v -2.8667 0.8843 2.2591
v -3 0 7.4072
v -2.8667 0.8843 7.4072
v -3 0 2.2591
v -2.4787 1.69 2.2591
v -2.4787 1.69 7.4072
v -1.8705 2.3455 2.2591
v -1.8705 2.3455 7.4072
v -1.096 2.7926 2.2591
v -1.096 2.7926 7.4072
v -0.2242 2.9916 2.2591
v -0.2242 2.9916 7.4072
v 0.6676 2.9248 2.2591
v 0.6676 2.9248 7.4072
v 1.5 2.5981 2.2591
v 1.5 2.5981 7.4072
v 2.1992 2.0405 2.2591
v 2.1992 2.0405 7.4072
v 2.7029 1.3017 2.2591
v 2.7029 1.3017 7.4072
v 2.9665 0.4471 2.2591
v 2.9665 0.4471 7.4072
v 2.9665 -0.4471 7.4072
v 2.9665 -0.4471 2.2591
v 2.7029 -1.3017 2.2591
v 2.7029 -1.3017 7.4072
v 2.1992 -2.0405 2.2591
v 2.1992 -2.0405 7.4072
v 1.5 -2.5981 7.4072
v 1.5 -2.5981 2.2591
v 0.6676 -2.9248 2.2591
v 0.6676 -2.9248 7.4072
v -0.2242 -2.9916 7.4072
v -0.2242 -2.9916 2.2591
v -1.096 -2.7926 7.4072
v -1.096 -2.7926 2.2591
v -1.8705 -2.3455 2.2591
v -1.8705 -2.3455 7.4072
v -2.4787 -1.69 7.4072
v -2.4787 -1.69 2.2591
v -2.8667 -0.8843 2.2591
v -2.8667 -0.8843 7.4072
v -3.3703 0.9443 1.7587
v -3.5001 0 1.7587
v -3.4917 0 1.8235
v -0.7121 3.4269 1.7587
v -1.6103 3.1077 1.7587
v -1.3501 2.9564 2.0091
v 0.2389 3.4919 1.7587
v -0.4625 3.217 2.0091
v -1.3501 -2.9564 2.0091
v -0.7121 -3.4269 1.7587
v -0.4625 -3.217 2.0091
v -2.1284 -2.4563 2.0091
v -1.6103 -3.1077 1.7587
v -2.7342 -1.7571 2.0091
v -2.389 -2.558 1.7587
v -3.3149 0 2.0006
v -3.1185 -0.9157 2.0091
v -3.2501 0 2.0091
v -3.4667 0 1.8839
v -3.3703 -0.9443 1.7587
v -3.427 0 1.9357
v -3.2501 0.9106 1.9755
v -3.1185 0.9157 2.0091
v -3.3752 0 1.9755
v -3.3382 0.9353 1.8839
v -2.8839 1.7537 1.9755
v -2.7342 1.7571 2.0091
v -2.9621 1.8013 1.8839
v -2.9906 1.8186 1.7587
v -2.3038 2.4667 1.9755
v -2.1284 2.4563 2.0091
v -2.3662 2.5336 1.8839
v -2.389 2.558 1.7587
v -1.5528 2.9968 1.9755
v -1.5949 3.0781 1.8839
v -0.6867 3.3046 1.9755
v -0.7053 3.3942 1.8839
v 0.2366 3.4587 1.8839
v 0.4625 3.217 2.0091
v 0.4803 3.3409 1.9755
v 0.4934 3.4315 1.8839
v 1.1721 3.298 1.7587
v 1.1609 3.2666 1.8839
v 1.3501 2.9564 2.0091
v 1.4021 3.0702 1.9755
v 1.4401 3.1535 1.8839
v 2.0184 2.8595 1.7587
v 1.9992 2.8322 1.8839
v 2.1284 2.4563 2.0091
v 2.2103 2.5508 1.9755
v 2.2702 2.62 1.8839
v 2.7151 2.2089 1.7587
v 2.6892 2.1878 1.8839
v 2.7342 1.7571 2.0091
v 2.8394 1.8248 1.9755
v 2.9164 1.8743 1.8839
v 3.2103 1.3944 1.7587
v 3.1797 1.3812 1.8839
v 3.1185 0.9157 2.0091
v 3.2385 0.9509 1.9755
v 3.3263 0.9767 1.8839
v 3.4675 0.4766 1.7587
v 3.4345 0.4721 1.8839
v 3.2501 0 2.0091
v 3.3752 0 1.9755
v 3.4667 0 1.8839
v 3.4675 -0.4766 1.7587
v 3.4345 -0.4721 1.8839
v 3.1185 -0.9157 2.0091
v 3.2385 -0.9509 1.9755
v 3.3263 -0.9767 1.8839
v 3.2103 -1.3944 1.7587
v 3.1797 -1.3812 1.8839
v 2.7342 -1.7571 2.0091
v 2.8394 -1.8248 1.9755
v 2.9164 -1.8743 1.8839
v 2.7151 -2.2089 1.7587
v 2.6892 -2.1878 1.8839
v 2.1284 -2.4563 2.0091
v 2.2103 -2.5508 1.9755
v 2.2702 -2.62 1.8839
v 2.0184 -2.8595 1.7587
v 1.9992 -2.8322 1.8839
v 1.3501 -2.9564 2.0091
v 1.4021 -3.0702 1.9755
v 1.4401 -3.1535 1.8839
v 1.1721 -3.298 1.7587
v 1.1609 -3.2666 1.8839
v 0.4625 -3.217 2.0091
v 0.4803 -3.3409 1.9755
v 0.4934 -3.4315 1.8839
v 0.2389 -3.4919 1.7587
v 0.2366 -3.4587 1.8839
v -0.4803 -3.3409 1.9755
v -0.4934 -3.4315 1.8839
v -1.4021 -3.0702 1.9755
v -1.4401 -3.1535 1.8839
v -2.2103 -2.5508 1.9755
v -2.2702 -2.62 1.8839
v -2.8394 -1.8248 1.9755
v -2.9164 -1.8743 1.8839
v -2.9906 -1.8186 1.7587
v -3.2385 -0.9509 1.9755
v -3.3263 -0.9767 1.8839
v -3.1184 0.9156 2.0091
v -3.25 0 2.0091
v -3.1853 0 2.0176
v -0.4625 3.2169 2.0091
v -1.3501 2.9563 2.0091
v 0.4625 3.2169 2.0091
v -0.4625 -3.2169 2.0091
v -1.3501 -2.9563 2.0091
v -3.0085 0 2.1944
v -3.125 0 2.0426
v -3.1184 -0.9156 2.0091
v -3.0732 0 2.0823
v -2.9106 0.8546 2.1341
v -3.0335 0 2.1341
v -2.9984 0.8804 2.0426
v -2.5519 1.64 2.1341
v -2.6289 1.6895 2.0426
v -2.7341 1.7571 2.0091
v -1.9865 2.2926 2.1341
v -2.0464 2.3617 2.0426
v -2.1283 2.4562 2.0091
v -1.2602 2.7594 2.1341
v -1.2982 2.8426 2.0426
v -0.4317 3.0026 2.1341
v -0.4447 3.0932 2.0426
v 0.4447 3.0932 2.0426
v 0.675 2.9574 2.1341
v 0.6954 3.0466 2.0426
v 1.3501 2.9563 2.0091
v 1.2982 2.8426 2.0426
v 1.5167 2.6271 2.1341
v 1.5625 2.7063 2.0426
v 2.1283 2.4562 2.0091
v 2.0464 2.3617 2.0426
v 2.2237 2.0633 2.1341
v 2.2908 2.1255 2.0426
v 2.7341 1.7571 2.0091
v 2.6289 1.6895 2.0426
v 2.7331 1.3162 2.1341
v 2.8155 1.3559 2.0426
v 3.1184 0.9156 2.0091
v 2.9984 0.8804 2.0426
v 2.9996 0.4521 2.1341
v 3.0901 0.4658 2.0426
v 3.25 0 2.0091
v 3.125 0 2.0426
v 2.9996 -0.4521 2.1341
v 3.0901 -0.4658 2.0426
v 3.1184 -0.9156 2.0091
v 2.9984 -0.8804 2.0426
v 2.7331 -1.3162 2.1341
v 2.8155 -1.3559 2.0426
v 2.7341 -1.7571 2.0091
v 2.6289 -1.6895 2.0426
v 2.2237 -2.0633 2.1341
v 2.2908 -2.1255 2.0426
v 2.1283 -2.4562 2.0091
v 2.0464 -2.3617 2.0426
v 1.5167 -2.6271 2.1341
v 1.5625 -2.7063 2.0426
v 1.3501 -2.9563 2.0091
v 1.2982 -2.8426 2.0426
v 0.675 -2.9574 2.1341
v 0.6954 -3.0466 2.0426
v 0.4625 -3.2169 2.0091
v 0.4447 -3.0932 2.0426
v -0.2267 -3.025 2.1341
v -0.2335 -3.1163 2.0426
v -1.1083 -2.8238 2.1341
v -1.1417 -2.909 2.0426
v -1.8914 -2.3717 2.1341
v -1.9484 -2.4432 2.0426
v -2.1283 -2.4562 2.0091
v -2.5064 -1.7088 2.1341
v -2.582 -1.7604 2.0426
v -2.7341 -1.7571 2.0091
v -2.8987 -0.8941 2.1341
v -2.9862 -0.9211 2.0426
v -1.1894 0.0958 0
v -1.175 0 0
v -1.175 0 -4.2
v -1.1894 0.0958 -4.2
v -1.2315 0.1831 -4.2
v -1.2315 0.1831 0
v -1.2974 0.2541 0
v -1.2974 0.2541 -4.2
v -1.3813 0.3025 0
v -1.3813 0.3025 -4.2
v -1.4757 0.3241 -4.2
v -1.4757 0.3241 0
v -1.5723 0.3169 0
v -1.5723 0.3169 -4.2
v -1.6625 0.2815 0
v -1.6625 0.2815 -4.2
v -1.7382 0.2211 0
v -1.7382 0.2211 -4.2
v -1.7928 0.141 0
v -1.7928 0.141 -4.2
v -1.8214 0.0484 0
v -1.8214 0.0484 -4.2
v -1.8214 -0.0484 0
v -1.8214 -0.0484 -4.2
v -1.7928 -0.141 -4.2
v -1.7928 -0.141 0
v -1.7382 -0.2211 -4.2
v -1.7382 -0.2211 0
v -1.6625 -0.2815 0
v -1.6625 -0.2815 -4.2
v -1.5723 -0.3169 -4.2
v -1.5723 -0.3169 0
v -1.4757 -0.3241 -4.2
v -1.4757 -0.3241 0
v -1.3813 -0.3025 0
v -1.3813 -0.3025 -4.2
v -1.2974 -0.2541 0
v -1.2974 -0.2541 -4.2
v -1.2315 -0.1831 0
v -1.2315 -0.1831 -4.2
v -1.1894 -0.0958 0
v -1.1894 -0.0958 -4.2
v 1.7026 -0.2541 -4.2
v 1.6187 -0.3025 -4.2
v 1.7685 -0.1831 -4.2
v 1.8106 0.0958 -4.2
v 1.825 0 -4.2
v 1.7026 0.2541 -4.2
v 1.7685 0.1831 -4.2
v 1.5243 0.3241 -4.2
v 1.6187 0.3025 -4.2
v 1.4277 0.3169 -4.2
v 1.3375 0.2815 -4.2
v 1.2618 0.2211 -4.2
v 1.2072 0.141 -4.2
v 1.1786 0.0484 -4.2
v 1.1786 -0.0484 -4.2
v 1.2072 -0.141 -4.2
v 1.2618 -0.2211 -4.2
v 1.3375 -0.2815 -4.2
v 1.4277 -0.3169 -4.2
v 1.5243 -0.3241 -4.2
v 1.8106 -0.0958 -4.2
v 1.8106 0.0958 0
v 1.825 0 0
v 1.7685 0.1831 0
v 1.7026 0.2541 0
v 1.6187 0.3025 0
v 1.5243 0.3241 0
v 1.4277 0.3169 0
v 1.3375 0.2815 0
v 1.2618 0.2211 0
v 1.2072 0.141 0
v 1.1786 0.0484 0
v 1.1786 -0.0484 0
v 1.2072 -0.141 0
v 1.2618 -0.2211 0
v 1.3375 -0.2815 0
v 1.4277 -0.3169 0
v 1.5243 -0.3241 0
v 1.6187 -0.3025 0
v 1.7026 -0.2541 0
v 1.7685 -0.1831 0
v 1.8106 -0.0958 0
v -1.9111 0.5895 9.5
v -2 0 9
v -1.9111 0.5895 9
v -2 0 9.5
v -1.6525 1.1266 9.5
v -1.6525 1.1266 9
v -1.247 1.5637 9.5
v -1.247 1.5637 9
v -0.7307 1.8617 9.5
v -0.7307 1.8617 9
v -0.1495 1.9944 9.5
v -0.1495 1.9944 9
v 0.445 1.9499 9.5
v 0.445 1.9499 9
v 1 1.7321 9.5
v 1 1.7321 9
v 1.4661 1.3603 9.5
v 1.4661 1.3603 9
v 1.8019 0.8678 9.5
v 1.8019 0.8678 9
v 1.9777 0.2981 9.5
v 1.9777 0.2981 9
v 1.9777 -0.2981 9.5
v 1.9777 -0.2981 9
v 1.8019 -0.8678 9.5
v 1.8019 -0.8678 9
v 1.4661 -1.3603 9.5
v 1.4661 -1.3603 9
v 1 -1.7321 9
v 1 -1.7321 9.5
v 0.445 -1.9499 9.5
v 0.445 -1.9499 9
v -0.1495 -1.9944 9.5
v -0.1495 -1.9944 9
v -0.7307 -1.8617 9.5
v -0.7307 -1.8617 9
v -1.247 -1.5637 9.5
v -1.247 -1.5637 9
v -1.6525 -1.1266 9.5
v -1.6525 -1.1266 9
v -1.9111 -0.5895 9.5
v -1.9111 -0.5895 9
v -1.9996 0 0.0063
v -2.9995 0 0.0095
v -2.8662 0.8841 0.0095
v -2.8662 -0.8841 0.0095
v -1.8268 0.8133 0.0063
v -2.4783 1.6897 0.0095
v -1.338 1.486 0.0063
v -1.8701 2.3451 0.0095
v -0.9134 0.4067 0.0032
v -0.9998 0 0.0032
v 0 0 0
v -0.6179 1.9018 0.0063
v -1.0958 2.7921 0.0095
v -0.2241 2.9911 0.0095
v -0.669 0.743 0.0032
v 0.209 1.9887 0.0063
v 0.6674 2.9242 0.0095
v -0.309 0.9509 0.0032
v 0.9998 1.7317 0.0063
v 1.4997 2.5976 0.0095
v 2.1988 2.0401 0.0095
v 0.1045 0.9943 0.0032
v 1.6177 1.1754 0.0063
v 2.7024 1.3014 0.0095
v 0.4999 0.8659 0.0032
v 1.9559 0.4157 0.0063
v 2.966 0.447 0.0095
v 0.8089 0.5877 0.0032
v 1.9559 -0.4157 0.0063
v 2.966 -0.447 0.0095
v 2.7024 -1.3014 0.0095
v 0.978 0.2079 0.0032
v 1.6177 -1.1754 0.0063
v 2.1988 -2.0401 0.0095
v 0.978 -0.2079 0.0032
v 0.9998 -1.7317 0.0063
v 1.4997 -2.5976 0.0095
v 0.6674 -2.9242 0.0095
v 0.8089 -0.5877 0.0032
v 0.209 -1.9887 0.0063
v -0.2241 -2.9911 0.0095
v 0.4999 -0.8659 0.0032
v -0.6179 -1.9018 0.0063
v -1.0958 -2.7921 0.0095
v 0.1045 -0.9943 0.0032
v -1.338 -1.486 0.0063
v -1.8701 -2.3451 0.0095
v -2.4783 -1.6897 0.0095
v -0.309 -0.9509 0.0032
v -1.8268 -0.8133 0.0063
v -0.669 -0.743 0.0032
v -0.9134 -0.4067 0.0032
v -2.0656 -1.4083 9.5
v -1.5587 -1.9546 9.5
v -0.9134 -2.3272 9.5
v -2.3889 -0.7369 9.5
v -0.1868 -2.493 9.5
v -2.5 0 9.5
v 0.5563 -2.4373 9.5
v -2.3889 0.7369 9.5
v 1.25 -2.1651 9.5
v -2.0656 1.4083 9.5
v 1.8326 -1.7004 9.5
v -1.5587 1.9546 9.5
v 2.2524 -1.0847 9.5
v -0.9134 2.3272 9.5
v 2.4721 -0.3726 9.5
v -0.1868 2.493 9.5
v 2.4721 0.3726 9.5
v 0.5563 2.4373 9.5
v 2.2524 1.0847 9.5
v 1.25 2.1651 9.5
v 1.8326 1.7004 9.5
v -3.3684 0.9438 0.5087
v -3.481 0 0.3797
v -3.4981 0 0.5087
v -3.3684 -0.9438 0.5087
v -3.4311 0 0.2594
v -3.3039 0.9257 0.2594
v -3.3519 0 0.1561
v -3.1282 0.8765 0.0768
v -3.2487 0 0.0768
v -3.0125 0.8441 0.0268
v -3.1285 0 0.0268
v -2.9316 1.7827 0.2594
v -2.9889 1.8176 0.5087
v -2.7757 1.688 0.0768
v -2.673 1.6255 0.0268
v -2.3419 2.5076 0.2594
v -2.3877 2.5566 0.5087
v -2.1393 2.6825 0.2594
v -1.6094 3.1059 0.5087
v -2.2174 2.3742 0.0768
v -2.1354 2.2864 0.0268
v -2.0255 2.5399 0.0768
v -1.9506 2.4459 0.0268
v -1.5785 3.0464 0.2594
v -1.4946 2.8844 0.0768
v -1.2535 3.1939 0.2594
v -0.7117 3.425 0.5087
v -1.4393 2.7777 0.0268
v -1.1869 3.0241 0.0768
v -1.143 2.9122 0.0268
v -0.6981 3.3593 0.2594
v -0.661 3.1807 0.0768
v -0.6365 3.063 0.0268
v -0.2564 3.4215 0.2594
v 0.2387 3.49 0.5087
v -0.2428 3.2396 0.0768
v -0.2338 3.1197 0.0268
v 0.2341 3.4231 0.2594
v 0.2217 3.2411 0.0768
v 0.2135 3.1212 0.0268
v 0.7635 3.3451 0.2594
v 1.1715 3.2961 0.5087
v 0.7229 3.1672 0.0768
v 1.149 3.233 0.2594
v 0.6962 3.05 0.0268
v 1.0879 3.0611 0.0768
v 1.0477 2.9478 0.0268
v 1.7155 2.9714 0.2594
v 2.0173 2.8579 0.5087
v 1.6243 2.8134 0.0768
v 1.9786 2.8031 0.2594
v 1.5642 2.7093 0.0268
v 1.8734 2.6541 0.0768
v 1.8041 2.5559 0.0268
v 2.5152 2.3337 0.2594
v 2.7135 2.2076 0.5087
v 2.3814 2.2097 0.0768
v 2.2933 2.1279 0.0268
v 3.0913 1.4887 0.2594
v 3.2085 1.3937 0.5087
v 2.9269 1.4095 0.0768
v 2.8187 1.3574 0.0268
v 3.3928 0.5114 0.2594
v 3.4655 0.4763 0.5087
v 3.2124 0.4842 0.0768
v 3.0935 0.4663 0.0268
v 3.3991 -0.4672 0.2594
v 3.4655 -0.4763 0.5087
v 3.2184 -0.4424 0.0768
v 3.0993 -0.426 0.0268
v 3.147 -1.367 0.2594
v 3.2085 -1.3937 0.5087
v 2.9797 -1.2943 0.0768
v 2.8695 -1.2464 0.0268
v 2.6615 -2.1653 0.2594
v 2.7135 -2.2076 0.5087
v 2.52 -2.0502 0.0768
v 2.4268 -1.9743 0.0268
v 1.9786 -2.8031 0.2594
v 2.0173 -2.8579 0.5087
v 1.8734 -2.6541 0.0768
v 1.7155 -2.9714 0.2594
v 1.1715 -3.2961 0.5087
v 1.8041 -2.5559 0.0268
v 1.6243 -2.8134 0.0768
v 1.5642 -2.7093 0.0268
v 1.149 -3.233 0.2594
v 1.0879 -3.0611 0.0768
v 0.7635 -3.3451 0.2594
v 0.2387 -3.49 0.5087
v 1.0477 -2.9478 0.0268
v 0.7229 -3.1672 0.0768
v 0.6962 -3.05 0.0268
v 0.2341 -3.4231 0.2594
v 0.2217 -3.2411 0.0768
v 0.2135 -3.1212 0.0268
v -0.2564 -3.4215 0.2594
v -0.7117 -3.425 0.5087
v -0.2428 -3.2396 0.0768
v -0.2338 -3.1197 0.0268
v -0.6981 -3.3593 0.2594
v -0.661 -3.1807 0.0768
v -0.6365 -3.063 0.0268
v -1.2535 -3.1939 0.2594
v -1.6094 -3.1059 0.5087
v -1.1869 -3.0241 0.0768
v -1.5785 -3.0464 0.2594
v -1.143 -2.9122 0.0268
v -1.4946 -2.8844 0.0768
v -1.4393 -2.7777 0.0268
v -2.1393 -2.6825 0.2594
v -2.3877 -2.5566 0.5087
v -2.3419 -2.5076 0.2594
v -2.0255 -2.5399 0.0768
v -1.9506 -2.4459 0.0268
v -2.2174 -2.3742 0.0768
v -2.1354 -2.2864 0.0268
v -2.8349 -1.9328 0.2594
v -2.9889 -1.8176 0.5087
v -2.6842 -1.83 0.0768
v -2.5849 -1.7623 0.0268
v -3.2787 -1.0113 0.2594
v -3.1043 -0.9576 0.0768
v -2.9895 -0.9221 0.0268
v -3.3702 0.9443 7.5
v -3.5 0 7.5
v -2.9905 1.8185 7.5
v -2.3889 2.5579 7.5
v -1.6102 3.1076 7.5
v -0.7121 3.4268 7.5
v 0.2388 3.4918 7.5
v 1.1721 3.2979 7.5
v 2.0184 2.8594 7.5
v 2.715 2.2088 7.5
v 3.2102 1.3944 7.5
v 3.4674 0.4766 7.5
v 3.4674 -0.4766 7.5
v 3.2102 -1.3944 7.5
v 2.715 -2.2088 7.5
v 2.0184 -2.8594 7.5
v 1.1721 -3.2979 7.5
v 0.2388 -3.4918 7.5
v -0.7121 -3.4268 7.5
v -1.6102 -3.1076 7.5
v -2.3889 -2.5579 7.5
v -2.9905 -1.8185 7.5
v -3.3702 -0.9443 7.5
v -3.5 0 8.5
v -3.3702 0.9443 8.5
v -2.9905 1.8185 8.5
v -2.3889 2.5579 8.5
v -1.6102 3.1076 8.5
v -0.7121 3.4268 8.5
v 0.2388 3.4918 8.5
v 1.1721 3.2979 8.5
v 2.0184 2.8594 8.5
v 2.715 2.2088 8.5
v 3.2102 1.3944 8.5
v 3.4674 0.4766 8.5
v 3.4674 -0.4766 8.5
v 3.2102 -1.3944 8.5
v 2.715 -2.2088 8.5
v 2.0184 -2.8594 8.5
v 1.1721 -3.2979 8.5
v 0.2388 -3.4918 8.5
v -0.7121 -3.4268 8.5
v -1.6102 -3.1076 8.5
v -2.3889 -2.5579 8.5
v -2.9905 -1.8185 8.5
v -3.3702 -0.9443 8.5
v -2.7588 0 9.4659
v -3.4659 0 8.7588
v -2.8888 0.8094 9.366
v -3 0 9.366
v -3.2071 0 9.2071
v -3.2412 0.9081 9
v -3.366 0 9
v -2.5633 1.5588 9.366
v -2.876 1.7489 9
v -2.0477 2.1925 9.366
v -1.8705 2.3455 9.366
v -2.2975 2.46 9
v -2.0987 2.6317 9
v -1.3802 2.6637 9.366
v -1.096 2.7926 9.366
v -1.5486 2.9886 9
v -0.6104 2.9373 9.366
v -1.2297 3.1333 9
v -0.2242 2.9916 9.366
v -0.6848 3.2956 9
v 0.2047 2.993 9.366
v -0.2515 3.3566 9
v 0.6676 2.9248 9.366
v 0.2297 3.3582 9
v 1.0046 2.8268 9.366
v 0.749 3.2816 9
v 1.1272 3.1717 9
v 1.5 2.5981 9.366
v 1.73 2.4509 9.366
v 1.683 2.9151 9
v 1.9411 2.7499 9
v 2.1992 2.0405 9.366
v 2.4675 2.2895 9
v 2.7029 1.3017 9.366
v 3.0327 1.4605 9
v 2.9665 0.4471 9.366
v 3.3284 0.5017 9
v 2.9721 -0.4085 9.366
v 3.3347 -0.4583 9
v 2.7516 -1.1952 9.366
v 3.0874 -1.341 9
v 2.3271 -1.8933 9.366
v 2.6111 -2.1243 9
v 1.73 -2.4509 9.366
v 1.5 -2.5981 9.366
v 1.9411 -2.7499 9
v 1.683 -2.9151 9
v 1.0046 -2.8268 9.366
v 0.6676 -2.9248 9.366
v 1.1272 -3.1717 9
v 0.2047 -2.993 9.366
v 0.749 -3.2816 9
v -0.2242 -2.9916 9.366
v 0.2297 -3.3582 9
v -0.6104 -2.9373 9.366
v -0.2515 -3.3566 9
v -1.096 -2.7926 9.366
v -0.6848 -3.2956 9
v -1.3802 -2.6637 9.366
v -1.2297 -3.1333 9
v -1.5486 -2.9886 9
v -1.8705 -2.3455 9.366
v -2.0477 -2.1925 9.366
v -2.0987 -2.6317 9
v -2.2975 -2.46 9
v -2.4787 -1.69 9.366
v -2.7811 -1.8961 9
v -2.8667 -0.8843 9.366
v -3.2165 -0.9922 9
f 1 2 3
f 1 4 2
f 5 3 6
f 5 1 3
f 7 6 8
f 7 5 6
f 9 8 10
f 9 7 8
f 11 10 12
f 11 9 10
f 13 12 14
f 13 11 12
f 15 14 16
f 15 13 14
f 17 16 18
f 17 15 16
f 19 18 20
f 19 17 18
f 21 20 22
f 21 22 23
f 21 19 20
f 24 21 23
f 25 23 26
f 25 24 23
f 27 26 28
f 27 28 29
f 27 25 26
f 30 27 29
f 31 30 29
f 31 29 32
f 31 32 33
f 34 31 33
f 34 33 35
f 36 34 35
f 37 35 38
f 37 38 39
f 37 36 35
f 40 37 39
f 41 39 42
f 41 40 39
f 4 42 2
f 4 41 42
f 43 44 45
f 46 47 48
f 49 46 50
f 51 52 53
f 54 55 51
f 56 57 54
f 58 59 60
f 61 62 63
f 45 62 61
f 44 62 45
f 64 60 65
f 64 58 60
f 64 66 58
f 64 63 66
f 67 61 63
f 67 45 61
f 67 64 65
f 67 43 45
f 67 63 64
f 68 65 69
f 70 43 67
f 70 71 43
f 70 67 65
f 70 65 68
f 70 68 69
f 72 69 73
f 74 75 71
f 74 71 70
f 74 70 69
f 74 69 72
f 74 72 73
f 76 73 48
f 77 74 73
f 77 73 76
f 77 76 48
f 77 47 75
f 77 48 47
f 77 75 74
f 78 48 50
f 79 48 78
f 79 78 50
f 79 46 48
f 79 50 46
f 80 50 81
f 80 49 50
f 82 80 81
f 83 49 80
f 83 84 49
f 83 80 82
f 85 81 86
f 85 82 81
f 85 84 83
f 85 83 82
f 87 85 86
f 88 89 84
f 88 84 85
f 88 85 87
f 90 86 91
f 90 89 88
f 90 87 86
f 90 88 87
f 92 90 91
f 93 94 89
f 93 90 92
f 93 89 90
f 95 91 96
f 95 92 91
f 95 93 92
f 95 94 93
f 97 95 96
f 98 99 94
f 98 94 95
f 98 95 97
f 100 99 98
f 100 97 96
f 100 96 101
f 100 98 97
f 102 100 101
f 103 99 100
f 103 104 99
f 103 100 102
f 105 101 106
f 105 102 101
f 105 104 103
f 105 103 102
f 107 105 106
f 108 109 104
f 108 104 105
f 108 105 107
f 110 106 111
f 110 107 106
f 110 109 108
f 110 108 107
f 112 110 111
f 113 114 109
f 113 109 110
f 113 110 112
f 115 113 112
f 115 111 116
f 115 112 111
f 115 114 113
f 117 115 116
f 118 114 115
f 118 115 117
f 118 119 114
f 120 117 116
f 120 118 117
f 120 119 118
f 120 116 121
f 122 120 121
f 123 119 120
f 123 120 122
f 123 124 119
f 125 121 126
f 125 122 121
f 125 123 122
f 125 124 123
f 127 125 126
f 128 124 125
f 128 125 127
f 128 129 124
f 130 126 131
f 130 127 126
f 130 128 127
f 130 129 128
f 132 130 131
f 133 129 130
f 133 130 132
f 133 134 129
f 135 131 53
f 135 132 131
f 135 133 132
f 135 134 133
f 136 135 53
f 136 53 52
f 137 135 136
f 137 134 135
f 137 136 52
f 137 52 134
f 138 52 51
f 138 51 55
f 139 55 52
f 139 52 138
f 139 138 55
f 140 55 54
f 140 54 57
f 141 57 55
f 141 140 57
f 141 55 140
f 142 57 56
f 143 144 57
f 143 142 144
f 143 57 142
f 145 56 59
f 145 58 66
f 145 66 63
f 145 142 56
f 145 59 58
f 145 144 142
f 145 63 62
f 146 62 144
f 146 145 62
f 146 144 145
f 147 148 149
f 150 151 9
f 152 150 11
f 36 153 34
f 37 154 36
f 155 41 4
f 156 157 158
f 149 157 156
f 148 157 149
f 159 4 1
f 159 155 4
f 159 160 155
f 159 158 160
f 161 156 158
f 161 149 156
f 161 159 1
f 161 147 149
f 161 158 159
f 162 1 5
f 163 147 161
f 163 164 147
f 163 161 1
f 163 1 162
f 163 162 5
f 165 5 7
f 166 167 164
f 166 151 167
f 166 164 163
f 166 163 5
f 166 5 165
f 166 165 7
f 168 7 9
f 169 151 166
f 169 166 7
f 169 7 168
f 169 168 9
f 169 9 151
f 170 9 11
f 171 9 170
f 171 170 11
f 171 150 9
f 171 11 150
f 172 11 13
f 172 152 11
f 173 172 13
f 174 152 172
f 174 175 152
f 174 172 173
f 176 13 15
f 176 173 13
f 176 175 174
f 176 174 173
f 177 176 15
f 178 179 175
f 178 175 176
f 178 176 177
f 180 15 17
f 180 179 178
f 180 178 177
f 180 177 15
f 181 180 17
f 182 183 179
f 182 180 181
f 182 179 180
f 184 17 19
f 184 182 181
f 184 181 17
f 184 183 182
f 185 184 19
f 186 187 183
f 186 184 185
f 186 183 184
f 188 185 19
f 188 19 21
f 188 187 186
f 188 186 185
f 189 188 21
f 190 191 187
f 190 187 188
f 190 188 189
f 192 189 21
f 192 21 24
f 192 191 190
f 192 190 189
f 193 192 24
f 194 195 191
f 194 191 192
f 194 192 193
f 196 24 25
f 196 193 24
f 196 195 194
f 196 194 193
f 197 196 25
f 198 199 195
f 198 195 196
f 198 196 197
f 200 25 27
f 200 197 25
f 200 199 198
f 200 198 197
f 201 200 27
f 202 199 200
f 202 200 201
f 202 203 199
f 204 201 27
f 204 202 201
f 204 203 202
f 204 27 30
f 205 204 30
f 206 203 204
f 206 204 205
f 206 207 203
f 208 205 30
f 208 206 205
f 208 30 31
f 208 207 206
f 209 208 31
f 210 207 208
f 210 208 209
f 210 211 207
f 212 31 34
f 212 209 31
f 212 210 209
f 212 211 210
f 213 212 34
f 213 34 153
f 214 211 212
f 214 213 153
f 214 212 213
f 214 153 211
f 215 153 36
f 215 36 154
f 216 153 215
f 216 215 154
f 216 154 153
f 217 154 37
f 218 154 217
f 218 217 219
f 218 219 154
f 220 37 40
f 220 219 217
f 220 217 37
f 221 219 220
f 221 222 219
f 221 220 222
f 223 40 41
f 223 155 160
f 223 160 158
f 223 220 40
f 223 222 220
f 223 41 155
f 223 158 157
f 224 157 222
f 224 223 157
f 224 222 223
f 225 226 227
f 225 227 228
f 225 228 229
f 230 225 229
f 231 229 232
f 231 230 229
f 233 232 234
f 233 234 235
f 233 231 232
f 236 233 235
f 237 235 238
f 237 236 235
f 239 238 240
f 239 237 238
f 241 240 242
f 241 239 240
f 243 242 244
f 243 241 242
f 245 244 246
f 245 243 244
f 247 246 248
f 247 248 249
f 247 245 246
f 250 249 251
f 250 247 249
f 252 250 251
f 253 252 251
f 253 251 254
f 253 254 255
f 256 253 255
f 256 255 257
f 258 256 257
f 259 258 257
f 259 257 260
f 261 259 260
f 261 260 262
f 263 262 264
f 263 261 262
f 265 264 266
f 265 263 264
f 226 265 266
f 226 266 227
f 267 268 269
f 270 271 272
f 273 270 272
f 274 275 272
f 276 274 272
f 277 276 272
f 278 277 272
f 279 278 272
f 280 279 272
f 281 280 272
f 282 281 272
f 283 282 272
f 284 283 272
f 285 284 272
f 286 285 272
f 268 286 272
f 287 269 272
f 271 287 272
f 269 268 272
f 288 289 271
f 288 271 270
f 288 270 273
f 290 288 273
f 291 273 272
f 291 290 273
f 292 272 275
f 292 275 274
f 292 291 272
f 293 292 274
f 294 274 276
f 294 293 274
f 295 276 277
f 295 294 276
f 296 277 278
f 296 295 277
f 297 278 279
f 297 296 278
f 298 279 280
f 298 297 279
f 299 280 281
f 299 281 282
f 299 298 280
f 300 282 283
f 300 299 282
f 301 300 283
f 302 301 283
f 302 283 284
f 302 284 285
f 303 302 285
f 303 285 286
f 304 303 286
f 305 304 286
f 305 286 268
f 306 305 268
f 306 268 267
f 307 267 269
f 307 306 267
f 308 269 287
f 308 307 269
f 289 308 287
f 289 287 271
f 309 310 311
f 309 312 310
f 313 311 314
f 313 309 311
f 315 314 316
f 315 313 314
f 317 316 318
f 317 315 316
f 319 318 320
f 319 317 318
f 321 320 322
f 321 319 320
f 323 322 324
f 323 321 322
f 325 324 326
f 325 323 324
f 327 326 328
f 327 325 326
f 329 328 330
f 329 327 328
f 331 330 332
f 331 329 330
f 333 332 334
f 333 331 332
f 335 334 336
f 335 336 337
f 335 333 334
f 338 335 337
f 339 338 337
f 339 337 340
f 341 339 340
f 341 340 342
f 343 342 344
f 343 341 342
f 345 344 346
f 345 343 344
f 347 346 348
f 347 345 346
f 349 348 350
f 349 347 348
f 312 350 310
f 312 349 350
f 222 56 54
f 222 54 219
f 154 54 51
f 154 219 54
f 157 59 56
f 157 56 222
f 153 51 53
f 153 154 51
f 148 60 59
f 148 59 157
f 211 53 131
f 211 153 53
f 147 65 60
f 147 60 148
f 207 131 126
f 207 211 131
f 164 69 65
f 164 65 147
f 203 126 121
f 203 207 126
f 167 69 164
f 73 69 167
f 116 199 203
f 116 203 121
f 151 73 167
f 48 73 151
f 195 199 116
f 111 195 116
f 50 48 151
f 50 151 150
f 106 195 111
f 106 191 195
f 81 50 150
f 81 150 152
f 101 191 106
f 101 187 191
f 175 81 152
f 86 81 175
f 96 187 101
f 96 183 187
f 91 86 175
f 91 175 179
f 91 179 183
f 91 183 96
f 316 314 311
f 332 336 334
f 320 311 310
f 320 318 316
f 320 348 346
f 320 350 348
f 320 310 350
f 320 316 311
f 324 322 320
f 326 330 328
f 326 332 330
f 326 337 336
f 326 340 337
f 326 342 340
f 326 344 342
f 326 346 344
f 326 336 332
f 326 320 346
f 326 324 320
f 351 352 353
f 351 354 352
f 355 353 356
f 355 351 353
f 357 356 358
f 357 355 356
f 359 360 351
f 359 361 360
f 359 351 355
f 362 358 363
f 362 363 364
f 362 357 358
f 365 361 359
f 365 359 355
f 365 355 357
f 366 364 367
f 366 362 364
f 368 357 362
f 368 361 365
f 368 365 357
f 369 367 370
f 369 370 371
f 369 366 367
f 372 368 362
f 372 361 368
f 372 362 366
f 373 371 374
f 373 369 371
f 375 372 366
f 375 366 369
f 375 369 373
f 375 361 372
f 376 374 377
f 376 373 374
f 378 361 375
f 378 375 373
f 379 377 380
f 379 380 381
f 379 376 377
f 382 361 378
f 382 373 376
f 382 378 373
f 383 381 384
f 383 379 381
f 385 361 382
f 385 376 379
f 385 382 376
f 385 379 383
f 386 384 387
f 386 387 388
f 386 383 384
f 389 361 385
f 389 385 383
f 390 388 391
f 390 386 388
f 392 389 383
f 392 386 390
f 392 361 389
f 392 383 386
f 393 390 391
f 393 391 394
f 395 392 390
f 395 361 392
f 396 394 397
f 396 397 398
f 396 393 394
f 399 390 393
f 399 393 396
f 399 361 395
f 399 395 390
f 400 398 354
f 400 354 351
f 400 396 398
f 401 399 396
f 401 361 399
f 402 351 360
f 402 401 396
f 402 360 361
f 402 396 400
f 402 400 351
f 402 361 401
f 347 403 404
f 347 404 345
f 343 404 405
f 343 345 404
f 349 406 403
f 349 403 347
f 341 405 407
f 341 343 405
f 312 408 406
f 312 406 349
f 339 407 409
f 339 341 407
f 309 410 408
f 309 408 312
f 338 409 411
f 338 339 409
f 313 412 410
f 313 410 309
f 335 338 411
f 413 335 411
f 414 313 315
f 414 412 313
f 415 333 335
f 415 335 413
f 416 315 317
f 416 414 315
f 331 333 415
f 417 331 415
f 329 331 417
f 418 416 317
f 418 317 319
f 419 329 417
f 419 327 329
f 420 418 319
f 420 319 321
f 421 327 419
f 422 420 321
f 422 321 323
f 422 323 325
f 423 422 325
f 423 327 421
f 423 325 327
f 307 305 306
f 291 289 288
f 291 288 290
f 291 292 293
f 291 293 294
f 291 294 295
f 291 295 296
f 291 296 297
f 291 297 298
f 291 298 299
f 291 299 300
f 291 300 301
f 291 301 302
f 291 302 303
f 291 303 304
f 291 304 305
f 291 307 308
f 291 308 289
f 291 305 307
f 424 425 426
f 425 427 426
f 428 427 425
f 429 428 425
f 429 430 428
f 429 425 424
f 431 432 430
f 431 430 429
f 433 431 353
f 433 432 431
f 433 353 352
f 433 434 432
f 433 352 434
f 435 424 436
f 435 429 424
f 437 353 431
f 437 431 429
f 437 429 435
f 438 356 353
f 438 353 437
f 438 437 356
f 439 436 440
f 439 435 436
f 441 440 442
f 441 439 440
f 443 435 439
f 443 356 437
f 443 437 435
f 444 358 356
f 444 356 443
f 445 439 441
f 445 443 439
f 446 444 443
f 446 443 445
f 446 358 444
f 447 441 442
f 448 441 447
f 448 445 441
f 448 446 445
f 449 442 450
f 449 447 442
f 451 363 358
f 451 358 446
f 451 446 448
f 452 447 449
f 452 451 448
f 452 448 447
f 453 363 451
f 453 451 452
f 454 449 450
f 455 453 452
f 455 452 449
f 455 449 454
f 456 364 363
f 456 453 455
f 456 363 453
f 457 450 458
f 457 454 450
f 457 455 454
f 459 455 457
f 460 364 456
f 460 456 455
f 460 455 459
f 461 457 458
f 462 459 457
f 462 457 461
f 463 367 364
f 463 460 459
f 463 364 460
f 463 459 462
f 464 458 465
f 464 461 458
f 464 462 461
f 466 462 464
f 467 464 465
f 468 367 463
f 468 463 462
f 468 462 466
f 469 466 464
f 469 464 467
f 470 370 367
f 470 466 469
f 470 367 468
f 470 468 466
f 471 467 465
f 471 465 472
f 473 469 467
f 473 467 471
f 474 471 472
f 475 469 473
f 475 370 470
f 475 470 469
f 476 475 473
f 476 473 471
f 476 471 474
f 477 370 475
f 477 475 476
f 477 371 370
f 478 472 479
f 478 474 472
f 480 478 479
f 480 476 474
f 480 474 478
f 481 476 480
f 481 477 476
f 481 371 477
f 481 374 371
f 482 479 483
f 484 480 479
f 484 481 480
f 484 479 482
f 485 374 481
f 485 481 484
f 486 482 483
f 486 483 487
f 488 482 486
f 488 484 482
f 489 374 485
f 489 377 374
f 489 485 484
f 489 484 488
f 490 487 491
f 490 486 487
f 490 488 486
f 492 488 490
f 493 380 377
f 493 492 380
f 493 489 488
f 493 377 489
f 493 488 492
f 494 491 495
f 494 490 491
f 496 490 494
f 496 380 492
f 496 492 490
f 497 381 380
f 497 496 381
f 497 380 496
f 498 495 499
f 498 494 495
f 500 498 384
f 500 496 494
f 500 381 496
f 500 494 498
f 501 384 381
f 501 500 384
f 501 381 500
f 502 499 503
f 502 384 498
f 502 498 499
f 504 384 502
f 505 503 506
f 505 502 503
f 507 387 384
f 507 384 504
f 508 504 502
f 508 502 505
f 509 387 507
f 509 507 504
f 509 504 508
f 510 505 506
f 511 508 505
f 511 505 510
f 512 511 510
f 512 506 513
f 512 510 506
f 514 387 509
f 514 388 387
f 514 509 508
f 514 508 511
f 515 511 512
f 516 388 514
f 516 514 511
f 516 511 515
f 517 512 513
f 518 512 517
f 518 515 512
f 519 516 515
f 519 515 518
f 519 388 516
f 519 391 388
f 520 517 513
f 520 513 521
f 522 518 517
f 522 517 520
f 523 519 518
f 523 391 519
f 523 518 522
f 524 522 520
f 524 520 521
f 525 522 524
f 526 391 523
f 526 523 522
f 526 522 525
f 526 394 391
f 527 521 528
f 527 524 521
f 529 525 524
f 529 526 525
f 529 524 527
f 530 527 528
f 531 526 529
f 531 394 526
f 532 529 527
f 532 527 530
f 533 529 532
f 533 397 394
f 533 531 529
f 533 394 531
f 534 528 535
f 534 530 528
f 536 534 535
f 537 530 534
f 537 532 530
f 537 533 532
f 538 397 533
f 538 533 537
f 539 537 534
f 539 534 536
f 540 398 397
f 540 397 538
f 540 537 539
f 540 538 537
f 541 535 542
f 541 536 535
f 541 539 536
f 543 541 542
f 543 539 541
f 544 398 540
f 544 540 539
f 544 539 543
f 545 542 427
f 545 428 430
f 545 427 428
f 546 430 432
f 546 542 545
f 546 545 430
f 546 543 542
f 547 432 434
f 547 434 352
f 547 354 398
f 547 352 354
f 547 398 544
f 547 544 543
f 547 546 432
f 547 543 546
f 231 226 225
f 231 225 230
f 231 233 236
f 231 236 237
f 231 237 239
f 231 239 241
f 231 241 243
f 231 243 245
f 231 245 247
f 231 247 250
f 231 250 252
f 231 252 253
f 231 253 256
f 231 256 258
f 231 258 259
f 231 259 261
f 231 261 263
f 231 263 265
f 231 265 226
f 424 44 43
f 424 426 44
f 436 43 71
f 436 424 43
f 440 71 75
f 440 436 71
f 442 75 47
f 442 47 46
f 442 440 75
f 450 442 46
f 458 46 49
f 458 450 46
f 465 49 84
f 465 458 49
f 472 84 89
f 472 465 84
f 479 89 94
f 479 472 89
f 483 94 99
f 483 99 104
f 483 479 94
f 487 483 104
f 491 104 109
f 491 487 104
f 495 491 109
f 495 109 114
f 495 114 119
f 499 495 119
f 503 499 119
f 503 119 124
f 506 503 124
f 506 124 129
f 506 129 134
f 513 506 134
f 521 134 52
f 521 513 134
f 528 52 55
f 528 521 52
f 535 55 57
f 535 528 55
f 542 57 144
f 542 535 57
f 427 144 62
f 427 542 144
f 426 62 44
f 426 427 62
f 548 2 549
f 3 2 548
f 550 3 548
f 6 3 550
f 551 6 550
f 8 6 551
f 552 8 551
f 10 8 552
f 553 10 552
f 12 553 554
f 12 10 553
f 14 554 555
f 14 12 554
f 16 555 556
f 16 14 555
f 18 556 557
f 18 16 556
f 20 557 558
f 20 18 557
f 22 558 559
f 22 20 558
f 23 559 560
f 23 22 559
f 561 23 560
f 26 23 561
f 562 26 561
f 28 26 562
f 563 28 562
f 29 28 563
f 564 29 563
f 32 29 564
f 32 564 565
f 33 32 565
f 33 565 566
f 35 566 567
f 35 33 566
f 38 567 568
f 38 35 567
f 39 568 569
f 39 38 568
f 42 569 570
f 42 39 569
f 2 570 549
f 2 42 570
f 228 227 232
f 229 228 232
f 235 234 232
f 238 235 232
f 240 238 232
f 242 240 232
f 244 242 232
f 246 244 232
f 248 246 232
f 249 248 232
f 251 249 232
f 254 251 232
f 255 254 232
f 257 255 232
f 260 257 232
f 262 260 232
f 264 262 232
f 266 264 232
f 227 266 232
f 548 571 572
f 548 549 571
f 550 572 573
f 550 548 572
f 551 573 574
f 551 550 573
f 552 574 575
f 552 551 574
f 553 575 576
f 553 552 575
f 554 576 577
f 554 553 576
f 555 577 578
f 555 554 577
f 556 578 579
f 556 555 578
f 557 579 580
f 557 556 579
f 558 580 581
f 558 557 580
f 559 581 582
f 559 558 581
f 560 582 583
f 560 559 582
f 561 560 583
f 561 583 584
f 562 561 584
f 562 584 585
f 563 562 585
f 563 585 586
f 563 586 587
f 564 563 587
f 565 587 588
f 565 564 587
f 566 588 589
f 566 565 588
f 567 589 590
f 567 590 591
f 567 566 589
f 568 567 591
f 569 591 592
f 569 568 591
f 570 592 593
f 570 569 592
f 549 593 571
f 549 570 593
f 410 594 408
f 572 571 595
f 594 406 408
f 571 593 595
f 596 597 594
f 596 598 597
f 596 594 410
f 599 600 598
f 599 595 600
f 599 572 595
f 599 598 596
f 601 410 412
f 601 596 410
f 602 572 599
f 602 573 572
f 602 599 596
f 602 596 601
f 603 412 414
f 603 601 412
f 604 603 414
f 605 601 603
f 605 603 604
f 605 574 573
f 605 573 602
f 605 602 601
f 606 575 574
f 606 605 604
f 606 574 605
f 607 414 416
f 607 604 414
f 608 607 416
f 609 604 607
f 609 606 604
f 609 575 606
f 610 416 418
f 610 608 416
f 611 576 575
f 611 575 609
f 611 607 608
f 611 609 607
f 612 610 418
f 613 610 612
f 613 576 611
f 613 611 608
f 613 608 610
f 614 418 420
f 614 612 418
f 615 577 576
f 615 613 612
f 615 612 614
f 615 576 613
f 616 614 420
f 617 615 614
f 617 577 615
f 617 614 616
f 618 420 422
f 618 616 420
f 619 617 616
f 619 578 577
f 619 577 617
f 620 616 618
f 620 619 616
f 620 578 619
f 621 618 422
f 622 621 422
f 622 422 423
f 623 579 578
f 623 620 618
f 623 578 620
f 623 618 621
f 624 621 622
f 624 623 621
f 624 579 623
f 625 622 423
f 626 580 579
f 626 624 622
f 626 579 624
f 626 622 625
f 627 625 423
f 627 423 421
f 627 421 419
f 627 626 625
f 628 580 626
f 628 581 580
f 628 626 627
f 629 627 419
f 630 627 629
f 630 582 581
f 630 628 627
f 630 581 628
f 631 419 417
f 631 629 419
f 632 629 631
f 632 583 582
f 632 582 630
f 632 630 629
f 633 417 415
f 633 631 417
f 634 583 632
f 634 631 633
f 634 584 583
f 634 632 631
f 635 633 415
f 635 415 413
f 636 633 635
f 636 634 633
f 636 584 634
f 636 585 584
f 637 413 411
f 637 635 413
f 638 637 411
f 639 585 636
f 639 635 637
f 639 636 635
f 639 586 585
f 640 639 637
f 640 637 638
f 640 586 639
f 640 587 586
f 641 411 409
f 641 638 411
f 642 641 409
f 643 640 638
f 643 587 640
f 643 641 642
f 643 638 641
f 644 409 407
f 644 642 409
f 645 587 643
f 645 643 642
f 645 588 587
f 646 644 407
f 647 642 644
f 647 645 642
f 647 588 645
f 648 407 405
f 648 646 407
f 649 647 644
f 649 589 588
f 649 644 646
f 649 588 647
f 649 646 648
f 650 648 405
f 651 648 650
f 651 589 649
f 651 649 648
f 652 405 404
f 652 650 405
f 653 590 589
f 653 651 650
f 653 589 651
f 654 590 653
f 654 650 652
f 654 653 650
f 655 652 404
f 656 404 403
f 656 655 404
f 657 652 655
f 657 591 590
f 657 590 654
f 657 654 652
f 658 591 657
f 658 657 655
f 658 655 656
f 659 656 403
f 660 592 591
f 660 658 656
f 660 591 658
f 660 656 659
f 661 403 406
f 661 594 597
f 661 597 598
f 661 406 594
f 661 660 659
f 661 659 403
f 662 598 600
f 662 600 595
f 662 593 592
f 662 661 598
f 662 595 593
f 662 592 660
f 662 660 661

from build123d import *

# Parameters (mm, degrees)
F2_R     = 0.325
F3_DEPTH = 4.2


with BuildPart() as f1:
    # F0 (on Front) → F1 (revolve)
    with BuildSketch(Plane.XZ):
        with BuildLine():
            Line((0, 9), (-2, 9))
            Line((-2, 9), (-2, 9.5))
            Line((-2, 9.5), (-2.5, 9.5))
            ThreePointArc((-2.5, 9.5), (-3.207107, 9.207107), (-3.5, 8.5))
            Line((-3.5, 8.5), (-3.5, 7.5))
            Line((-3.5, 7.5), (-3, 7.407196))
            Line((-3, 7.407196), (-3, 2.259095))
            ThreePointArc((-3, 2.259095), (-3.073223, 2.082318), (-3.25, 2.009095))
            Line((-3.25, 2.009095), (-3.250103, 2.009095))
            ThreePointArc((-3.250103, 2.009095), (-3.42702, 1.935732), (-3.500103, 1.7587))
            Line((-3.500103, 1.7587), (-3.498128, 0.5087))
            ThreePointArc((-3.498128, 0.5087), (-3.35187, 0.156125), (-2.999452, 0.009492))
            Line((-2.999452, 0.009492), (0, 0))
            Line((0, 0), (0, 9))
        make_face()
    revolve(axis=Axis((0, 0, 4.5), (0, 0, -1)))


with BuildPart() as f3:
    # F2 (on Top) → F3 (new body)
    with BuildSketch(Plane.XY):
        with BuildLine():
            ThreePointArc((1.175, 0), (1.5, -0.325), (1.825, 0))
            ThreePointArc((1.825, 0), (1.5, 0.325), (1.175, 0))
        make_face()
        with Locations((-1.5, 0)):
            Circle(F2_R)
    extrude(amount=-F3_DEPTH)


solid = Compound([f1.part, f3.part])
